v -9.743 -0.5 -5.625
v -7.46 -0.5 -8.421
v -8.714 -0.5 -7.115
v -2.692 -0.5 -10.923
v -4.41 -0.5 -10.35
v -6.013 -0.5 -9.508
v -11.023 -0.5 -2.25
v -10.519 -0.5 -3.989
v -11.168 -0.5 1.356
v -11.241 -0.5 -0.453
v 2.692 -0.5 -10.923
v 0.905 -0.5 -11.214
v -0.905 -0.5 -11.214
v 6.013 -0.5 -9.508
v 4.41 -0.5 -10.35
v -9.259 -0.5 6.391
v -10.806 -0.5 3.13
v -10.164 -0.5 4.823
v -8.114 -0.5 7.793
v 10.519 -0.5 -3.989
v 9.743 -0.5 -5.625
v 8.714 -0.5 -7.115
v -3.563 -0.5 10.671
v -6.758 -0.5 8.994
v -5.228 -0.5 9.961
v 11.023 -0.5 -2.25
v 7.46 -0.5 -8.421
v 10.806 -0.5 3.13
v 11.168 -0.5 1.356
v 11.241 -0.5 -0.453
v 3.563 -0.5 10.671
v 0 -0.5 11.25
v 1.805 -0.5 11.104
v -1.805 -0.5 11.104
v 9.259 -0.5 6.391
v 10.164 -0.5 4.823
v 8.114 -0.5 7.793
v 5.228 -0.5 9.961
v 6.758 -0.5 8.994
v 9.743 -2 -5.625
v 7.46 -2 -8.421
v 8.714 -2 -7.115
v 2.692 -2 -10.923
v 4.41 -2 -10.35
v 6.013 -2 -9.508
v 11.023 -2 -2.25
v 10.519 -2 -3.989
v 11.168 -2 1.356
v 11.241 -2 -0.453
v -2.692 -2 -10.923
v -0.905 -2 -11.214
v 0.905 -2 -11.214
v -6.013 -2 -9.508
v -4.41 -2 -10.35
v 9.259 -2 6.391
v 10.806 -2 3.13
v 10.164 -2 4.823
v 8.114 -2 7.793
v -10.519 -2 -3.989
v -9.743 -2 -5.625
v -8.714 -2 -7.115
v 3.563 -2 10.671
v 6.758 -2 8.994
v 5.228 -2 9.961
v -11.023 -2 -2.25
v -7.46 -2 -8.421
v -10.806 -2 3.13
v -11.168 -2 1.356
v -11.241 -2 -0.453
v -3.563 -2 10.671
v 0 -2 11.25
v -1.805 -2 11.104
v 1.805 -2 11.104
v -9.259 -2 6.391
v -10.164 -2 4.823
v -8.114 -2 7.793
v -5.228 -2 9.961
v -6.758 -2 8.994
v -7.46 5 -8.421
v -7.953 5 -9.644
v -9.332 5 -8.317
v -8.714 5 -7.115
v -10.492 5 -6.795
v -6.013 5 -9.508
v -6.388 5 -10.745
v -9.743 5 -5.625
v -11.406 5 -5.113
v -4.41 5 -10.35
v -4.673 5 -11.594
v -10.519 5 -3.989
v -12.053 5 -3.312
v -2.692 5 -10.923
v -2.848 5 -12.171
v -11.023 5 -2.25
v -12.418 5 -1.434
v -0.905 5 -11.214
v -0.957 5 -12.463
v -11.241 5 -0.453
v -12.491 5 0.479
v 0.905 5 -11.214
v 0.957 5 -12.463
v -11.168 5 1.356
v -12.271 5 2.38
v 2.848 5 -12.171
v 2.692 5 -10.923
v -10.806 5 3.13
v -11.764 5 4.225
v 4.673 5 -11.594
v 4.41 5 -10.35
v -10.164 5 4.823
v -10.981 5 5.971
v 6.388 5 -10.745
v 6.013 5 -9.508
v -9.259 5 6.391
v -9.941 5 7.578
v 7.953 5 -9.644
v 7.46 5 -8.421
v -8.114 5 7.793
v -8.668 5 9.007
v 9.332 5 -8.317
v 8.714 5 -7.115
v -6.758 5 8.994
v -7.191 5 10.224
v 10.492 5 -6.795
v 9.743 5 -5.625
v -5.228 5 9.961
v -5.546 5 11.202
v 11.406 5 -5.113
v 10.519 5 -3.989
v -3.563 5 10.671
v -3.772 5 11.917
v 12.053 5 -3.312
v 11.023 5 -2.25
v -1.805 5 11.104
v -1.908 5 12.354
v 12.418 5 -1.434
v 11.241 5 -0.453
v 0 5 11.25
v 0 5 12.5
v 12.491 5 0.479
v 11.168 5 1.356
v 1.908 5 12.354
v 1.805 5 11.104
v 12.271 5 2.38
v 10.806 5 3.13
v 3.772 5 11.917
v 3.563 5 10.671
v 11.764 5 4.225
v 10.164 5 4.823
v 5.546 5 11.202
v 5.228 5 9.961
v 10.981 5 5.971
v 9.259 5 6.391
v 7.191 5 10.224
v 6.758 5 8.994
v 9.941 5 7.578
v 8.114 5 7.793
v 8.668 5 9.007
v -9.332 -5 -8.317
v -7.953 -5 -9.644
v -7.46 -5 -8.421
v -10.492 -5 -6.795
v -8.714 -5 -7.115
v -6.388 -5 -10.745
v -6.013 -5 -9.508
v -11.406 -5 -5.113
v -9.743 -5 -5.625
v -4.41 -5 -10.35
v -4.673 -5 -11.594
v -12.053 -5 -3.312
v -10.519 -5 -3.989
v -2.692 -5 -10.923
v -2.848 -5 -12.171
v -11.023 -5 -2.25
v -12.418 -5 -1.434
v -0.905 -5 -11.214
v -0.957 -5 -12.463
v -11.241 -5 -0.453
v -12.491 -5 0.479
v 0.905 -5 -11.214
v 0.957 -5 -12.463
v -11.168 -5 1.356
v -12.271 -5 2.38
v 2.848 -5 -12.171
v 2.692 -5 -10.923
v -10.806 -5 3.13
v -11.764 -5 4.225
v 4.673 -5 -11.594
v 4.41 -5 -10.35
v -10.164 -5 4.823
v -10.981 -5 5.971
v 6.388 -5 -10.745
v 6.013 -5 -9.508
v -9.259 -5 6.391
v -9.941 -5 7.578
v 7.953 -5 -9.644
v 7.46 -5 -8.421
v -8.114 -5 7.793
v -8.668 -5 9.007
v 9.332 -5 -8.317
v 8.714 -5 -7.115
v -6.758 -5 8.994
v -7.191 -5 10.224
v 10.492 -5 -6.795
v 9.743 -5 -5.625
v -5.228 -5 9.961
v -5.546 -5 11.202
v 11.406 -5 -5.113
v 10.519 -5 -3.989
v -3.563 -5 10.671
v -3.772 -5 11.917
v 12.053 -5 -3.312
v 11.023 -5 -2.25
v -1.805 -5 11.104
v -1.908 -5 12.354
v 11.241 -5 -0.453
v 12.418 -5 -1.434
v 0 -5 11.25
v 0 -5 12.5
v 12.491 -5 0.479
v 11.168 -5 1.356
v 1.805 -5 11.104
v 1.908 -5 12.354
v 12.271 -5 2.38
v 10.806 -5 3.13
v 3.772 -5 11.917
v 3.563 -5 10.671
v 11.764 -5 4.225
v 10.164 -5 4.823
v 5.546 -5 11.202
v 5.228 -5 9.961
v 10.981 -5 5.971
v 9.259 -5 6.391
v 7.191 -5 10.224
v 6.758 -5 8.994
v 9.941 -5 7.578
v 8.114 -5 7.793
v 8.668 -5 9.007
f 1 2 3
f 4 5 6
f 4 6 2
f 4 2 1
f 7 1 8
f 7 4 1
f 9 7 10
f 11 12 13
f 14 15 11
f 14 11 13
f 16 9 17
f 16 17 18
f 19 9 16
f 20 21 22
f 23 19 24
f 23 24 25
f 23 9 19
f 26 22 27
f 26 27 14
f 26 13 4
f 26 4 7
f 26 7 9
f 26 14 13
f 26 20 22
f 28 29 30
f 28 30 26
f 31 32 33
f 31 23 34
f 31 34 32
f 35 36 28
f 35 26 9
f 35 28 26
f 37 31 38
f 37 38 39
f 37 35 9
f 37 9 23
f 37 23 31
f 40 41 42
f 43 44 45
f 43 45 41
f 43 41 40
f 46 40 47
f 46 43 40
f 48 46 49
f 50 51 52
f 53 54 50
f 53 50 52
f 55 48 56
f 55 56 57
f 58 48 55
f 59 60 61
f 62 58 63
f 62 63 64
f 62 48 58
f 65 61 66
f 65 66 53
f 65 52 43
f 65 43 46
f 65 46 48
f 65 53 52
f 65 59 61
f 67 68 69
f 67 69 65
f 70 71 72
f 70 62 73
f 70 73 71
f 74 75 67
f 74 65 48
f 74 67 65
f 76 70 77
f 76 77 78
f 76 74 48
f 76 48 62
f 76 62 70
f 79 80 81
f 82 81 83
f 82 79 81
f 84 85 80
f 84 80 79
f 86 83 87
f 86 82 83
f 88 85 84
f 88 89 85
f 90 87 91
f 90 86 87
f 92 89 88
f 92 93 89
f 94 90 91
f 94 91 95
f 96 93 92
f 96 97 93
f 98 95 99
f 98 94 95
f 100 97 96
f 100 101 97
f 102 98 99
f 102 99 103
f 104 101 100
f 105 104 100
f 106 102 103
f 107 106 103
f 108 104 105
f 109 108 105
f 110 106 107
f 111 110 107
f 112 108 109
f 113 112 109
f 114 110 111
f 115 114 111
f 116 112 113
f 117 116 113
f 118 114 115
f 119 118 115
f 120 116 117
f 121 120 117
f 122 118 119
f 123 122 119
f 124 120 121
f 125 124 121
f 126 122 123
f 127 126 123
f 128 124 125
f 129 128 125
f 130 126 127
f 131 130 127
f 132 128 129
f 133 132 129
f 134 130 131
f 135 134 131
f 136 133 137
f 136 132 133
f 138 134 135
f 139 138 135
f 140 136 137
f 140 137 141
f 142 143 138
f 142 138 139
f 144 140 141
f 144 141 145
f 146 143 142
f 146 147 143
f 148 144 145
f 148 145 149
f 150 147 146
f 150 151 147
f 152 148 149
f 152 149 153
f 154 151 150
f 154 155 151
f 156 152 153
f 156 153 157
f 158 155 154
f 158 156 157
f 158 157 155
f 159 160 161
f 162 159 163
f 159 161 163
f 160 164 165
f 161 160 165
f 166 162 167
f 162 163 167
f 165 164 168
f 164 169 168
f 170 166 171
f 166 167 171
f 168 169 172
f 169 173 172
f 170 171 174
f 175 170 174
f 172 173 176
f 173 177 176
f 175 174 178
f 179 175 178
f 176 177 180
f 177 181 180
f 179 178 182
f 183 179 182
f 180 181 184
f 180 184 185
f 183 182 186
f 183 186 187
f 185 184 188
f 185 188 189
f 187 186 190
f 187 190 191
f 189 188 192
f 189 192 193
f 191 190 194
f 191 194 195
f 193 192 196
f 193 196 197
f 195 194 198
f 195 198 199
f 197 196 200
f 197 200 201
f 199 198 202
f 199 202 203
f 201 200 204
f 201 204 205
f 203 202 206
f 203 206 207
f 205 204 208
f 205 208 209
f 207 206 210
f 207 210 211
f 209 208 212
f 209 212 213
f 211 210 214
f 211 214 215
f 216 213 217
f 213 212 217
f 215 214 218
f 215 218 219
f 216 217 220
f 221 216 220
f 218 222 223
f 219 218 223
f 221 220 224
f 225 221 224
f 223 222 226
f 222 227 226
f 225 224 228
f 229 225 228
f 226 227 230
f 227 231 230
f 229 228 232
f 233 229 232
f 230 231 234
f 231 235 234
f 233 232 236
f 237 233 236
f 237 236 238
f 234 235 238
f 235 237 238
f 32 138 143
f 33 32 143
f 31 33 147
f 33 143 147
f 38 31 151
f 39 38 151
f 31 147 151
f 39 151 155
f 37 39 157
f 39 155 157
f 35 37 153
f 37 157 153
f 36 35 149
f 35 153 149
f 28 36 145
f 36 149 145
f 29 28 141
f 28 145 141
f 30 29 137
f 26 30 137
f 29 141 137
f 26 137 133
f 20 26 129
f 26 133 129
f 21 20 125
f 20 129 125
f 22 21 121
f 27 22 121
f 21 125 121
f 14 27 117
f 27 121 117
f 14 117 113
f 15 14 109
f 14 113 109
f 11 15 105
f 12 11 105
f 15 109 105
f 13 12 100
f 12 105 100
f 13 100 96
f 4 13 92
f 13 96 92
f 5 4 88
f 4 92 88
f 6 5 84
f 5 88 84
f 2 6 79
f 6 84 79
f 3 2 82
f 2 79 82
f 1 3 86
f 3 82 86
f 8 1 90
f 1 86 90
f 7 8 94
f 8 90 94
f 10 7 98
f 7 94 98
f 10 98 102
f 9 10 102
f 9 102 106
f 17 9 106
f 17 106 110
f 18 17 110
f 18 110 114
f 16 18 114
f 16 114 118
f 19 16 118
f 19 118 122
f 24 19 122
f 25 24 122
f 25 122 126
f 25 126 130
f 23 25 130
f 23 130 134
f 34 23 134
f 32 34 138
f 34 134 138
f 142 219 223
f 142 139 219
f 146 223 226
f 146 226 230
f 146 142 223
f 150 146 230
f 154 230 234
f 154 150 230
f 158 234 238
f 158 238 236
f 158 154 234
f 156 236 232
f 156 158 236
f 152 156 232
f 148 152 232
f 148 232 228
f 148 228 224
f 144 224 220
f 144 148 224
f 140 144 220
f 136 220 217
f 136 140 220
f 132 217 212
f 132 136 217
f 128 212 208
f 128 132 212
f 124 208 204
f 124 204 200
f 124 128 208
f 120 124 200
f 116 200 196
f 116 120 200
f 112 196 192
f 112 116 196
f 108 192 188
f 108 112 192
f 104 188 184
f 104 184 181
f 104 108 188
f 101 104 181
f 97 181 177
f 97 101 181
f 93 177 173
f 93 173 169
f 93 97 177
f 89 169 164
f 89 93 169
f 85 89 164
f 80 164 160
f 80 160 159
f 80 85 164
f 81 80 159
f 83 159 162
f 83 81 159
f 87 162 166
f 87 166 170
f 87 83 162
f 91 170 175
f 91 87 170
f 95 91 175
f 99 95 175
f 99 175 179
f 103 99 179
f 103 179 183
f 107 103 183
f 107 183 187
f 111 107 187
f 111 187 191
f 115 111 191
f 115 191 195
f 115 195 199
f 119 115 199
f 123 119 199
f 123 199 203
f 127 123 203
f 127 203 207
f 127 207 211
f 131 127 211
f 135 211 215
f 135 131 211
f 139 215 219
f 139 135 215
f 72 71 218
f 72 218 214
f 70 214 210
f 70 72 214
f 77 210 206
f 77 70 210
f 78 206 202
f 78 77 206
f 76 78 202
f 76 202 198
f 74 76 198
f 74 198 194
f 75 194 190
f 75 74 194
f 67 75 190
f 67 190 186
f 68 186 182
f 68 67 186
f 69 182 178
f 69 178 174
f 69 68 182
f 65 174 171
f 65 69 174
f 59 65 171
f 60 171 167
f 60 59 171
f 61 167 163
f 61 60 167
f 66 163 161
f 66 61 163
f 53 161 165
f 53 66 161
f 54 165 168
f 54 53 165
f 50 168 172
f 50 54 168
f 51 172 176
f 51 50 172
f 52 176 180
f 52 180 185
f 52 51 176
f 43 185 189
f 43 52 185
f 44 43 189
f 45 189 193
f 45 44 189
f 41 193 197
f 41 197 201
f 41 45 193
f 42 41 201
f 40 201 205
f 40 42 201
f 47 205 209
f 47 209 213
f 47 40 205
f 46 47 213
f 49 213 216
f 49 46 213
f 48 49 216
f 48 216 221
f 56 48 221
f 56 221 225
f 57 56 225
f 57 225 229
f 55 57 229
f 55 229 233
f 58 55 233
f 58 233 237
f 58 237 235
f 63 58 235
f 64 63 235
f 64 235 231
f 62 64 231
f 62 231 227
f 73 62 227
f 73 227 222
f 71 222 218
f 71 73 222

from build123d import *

# Parameters (mm, degrees)
SKETCH1_R           = 12.5
BOSS_EXTRUDE1_DEPTH = 5
SKETCH2_R           = 11.25
CUT_EXTRUDE1_DEPTH  = 5.5
CUT_EXTRUDE2_START  = -3
SKETCH3_R           = 11.25
CUT_EXTRUDE2_DEPTH  = 3


with BuildPart() as part:
    # Sketch1 → Boss-Extrude1 (new, symmetric)
    with BuildSketch(Plane(origin=(0, 0, 0), x_dir=(1, 0, 0), z_dir=(0, 1, 0))):
        with Locations(Location((0, 0, 0), (0, 0, 270))):
            Circle(SKETCH1_R)
    extrude(amount=BOSS_EXTRUDE1_DEPTH, both=True)

    # Sketch2 → Cut-Extrude1 (cut)
    with BuildSketch(Plane(origin=(0, 5, 0), x_dir=(1, 0, 0), z_dir=(0, 1, 0))):
        with Locations(Location((0, 0, 0), (0, 0, 270))):
            Circle(SKETCH2_R)
    extrude(amount=-CUT_EXTRUDE1_DEPTH, mode=Mode.SUBTRACT)

    # Sketch3 → Cut-Extrude2 (cut)
    with BuildSketch(Plane.XZ.offset(5).offset(CUT_EXTRUDE2_START)):
        with Locations(Location((0, 0, 0), (0, 0, 90))):
            Circle(SKETCH3_R)
    extrude(amount=CUT_EXTRUDE2_DEPTH, mode=Mode.SUBTRACT)


solid = part.part
